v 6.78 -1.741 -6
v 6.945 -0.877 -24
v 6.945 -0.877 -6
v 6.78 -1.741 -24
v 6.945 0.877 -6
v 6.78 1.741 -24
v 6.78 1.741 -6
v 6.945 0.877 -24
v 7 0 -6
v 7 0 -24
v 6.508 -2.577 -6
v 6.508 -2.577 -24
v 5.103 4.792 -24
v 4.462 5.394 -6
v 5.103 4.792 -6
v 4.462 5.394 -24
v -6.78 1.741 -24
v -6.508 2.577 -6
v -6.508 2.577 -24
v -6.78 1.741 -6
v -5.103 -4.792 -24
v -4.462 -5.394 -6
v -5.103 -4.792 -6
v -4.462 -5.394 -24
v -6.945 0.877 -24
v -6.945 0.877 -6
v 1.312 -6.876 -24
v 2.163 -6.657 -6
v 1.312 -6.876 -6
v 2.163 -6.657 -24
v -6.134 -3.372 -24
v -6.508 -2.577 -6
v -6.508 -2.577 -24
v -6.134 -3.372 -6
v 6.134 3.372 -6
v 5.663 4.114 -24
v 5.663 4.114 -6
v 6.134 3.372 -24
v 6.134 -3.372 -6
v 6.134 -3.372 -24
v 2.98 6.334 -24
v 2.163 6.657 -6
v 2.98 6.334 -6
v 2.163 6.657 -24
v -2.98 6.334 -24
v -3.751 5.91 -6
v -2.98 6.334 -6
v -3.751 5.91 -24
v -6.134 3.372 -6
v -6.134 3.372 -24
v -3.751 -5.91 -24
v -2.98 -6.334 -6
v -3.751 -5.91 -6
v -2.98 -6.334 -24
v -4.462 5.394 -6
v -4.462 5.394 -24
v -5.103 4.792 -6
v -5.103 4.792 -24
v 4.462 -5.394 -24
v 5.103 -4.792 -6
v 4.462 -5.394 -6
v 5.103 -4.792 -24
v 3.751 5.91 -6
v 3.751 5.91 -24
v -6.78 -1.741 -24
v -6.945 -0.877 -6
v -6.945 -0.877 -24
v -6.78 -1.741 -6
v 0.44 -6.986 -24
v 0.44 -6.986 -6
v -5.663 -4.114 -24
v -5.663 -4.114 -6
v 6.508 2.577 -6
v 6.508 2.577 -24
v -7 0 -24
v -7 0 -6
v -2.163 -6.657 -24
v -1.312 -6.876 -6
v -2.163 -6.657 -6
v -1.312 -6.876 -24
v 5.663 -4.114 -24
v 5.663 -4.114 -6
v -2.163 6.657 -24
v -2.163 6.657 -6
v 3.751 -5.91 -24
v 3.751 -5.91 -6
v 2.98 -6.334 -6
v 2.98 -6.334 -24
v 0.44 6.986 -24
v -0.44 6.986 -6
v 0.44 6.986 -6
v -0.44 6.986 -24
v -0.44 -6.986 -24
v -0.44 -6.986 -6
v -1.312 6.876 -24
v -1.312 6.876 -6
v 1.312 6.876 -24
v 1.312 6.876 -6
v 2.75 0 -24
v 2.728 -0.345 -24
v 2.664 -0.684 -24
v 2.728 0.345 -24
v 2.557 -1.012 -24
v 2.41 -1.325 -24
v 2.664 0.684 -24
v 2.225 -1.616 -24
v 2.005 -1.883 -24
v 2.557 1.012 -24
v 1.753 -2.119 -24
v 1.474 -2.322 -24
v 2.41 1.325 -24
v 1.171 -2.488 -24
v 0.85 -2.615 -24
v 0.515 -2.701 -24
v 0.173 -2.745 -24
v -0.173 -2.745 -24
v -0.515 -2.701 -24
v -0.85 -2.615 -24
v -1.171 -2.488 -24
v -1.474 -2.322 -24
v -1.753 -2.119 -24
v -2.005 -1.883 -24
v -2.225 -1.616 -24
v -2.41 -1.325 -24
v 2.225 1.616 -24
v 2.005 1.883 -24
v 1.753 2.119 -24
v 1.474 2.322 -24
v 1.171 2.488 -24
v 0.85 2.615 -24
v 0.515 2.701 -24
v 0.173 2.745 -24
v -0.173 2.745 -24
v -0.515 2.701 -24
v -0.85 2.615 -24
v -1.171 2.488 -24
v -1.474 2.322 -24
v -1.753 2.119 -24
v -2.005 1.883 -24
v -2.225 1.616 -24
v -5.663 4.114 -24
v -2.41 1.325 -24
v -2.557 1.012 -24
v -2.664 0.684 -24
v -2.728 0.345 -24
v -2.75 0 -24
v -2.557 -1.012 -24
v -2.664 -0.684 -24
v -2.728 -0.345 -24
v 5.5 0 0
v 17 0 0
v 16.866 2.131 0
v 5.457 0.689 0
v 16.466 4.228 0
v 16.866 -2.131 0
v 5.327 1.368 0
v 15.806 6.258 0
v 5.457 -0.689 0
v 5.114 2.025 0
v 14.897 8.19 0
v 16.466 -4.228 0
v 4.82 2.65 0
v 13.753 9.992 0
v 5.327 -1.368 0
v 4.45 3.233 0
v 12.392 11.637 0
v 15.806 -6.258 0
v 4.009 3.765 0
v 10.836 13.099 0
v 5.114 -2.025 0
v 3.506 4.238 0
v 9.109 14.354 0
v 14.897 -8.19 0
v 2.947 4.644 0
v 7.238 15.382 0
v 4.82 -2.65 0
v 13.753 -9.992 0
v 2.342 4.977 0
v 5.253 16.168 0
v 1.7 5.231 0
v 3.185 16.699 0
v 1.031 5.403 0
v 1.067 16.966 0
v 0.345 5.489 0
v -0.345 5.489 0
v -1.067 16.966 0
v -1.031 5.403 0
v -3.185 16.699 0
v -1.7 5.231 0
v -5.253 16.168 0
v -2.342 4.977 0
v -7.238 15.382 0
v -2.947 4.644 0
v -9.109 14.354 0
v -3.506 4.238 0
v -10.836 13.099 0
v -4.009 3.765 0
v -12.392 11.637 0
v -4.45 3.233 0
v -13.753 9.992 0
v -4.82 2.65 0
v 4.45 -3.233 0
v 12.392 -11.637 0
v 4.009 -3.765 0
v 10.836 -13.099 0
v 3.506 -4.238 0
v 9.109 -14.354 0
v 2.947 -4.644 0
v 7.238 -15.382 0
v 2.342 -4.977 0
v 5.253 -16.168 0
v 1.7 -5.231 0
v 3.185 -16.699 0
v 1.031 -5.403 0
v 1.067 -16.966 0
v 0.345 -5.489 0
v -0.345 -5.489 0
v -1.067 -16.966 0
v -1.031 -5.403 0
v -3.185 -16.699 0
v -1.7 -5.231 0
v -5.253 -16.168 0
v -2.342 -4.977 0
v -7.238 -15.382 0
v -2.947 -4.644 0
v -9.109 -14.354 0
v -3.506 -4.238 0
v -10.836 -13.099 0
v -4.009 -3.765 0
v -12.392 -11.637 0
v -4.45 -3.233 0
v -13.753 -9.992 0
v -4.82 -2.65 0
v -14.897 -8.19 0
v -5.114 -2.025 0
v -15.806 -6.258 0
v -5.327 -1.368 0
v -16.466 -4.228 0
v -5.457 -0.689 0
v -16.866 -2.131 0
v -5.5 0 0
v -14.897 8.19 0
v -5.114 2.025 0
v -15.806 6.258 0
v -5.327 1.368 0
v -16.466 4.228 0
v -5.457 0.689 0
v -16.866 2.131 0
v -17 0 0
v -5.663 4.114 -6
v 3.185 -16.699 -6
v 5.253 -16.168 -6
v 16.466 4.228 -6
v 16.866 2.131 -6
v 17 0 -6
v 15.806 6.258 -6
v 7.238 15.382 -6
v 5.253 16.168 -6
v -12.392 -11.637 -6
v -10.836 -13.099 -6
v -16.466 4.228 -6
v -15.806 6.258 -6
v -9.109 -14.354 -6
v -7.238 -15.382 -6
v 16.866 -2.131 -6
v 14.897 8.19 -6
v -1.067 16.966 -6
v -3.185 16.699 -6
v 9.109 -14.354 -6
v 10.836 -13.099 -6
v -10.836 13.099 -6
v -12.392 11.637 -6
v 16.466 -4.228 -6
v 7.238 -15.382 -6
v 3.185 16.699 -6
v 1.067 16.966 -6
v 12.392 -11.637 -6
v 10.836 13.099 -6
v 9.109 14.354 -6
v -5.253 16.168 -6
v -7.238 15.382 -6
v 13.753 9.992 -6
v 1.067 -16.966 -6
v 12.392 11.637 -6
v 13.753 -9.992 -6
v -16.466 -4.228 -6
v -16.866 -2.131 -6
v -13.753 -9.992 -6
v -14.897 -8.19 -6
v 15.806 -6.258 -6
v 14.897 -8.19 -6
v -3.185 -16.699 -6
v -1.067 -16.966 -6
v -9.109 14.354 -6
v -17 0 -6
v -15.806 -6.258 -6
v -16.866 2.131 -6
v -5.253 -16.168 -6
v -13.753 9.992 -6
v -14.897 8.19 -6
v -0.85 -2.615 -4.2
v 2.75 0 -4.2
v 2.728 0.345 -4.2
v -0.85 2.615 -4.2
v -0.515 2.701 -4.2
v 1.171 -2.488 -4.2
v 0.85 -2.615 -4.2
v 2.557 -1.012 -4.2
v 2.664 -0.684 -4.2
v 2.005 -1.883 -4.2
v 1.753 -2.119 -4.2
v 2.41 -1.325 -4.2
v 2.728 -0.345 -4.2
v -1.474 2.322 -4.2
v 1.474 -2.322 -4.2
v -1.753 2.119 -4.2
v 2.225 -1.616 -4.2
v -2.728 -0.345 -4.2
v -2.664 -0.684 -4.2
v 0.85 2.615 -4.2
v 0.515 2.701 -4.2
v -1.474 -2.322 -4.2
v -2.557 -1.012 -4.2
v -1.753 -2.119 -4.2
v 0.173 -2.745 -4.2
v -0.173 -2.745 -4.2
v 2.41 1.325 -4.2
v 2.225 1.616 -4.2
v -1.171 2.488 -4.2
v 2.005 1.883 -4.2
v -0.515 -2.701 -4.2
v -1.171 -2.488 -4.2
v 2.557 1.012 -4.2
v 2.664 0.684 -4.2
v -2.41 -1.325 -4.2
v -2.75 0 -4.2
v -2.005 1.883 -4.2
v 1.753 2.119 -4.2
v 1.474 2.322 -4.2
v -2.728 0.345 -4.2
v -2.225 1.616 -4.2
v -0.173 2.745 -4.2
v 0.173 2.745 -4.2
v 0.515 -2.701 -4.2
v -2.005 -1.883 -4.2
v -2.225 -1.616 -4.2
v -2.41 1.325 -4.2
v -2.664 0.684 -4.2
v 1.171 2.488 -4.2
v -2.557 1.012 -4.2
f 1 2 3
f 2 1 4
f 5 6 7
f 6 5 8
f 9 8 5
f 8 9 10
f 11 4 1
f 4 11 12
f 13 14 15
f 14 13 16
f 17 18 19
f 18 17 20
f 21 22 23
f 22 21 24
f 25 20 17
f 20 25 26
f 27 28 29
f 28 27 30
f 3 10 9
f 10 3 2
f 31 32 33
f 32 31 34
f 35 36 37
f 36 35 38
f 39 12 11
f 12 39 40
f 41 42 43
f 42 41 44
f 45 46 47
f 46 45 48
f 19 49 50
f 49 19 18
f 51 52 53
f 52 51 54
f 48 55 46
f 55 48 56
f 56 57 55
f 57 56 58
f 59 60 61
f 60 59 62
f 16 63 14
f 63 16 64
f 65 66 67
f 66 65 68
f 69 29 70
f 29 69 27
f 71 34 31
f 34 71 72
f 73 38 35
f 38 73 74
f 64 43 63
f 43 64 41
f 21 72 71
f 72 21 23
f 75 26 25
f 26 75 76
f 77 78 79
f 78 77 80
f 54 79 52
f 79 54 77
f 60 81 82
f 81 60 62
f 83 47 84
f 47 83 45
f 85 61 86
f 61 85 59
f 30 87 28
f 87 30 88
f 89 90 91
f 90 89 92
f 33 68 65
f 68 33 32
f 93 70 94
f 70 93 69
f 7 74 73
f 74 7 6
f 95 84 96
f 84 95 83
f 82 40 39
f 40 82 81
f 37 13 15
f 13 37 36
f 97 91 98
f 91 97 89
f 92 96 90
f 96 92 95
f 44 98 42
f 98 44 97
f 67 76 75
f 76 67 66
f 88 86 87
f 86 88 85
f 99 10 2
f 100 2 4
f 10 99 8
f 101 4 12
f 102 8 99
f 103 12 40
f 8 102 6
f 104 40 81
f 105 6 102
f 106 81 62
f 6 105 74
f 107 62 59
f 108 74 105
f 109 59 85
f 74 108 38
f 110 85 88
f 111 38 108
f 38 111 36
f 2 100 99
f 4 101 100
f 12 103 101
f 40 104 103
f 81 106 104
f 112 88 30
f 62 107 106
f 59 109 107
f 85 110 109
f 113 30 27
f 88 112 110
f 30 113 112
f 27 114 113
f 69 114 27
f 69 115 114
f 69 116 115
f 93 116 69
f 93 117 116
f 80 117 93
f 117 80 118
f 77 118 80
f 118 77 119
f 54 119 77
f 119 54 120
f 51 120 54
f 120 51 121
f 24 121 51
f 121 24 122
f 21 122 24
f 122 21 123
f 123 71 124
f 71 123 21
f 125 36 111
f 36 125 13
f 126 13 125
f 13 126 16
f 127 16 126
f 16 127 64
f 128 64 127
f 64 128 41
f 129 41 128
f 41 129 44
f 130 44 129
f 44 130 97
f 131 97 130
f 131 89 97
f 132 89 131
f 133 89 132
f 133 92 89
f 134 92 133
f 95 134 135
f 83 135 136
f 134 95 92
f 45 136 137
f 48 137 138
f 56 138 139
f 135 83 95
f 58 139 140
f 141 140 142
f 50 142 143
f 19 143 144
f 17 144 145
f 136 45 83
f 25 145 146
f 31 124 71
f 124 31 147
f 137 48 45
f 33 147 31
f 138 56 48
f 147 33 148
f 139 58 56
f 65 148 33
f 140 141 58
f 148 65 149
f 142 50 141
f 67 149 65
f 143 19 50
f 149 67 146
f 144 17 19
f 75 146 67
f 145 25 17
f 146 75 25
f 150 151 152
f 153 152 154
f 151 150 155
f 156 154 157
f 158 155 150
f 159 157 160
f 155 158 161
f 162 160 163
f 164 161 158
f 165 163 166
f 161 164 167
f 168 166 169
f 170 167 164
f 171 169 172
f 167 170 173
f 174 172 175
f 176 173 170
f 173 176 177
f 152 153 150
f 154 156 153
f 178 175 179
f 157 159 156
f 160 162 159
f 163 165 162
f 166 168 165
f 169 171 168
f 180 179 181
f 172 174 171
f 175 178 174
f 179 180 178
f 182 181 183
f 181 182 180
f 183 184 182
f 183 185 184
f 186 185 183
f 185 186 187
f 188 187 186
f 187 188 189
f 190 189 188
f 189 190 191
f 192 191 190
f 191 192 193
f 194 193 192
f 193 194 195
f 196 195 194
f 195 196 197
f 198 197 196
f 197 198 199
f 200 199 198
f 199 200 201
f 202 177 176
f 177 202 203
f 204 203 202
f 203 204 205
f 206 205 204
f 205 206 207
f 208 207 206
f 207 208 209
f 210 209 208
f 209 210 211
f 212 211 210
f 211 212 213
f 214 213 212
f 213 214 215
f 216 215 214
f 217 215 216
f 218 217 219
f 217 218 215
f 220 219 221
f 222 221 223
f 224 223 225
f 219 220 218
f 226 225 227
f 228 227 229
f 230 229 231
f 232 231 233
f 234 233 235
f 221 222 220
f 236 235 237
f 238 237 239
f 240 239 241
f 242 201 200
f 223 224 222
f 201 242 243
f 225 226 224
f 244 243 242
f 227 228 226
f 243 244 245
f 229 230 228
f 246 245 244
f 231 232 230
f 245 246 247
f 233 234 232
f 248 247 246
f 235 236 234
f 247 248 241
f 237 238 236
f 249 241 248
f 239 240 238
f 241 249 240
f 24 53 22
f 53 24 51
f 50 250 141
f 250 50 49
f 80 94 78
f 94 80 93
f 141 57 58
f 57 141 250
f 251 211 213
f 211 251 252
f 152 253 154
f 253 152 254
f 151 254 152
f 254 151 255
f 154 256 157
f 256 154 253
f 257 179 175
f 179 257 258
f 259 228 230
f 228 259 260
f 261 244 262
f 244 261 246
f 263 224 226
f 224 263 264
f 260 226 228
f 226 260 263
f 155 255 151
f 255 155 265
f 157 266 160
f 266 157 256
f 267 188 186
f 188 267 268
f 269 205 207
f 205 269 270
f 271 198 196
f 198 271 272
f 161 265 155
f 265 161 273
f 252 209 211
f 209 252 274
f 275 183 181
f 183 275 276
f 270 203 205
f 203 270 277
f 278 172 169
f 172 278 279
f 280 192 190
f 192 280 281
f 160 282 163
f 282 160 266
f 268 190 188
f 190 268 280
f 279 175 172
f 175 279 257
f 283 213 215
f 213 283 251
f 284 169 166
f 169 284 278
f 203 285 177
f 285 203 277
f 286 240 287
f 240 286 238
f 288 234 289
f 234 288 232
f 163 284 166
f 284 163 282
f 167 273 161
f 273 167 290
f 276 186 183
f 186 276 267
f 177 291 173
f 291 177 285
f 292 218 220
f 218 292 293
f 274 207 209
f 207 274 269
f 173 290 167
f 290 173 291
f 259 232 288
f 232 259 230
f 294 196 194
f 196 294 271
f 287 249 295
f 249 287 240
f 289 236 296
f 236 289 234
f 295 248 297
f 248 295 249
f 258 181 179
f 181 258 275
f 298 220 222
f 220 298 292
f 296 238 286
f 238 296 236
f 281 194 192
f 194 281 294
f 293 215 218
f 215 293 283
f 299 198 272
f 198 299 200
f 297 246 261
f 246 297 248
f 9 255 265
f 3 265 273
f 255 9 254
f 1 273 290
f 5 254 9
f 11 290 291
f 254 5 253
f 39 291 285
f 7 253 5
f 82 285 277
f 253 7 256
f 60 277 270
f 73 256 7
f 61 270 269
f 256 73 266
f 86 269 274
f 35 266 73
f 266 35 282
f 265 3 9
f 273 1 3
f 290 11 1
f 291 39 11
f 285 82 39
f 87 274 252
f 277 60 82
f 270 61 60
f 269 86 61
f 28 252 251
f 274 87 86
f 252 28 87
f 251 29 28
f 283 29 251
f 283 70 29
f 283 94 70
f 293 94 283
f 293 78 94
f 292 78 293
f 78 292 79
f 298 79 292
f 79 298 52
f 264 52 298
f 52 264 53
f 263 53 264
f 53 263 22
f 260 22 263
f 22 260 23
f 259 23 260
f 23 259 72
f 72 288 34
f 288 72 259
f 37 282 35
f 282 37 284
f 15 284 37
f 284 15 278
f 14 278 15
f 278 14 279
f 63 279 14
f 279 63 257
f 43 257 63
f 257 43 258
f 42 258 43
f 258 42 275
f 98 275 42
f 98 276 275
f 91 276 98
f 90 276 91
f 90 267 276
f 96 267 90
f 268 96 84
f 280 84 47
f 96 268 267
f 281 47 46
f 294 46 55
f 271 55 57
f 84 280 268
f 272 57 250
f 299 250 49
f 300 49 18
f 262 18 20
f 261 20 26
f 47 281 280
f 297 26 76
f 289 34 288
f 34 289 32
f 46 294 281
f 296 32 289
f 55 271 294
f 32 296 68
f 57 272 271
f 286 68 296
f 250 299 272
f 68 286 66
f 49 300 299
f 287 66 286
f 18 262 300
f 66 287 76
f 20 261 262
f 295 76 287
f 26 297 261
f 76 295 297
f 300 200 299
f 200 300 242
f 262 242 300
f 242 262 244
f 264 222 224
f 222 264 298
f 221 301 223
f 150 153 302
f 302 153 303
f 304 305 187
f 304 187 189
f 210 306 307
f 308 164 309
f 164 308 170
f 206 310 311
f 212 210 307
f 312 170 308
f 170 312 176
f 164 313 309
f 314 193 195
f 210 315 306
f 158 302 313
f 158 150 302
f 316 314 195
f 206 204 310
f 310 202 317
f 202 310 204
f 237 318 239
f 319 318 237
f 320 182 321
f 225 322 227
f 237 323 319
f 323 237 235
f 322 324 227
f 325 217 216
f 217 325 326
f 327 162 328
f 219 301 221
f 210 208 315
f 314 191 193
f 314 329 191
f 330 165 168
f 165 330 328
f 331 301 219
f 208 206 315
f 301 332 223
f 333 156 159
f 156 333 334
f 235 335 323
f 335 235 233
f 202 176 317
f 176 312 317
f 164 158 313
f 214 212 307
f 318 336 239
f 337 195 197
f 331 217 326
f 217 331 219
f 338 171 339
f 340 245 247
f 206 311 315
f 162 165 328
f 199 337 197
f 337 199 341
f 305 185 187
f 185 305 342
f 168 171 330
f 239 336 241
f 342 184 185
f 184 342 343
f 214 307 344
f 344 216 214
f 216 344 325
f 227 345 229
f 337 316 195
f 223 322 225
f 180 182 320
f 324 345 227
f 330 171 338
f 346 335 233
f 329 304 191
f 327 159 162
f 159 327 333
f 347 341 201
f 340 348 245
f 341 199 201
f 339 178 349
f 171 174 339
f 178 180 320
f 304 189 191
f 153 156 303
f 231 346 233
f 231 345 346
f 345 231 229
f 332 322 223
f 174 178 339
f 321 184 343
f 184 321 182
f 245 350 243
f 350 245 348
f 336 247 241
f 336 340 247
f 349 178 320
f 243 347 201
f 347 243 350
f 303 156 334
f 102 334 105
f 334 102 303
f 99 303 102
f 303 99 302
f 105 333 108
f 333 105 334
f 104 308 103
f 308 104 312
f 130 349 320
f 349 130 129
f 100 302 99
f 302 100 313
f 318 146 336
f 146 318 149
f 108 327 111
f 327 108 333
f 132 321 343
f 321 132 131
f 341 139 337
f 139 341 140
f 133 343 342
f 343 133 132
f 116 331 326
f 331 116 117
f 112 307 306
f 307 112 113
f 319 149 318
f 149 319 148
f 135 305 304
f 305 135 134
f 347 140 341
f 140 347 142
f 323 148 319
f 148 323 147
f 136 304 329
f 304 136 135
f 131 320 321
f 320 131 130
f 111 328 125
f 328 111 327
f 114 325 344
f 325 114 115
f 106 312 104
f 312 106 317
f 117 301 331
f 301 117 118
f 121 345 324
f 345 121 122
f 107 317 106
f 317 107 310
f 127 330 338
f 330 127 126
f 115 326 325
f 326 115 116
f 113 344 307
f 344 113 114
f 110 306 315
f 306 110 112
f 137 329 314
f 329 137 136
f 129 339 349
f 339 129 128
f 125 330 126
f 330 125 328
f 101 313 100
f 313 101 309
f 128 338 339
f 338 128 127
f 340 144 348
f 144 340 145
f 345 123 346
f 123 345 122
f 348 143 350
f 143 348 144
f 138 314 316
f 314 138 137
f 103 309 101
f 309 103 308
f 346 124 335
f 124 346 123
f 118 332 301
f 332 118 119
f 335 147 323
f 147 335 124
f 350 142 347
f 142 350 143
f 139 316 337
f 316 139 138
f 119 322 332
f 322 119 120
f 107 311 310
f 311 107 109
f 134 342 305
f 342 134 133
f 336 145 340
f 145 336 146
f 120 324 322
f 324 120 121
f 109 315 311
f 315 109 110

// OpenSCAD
$fn = 50;


difference() {
	union() {
		translate(v = [0, 0, -24.0000000000]) {
			cylinder(h = 24, r = 7.0000000000);
		}
		translate(v = [0, 0, -6.0000000000]) {
			cylinder(h = 6, r = 17.0000000000);
		}
	}
	union() {
		translate(v = [0, 0, 0]) {
			rotate(a = [0, 0, 0]) {
				difference() {
					union() {
						#translate(v = [0, 0, -24.0000000000]) {
							cylinder(h = 24, r = 2.2500000000);
						}
						#translate(v = [0, 0, -4.2000000000]) {
							cylinder(h = 4.2000000000, r = 7.0000000000, r1 = 2.7500000000, r2 = 5.5000000000);
						}
						#translate(v = [0, 0, -24.0000000000]) {
							cylinder(h = 24, r = 2.7500000000);
						}
						#translate(v = [0, 0, -24.0000000000]) {
							cylinder(h = 24, r = 2.2500000000);
						}
					}
					union();
				}
			}
		}
	}
}
